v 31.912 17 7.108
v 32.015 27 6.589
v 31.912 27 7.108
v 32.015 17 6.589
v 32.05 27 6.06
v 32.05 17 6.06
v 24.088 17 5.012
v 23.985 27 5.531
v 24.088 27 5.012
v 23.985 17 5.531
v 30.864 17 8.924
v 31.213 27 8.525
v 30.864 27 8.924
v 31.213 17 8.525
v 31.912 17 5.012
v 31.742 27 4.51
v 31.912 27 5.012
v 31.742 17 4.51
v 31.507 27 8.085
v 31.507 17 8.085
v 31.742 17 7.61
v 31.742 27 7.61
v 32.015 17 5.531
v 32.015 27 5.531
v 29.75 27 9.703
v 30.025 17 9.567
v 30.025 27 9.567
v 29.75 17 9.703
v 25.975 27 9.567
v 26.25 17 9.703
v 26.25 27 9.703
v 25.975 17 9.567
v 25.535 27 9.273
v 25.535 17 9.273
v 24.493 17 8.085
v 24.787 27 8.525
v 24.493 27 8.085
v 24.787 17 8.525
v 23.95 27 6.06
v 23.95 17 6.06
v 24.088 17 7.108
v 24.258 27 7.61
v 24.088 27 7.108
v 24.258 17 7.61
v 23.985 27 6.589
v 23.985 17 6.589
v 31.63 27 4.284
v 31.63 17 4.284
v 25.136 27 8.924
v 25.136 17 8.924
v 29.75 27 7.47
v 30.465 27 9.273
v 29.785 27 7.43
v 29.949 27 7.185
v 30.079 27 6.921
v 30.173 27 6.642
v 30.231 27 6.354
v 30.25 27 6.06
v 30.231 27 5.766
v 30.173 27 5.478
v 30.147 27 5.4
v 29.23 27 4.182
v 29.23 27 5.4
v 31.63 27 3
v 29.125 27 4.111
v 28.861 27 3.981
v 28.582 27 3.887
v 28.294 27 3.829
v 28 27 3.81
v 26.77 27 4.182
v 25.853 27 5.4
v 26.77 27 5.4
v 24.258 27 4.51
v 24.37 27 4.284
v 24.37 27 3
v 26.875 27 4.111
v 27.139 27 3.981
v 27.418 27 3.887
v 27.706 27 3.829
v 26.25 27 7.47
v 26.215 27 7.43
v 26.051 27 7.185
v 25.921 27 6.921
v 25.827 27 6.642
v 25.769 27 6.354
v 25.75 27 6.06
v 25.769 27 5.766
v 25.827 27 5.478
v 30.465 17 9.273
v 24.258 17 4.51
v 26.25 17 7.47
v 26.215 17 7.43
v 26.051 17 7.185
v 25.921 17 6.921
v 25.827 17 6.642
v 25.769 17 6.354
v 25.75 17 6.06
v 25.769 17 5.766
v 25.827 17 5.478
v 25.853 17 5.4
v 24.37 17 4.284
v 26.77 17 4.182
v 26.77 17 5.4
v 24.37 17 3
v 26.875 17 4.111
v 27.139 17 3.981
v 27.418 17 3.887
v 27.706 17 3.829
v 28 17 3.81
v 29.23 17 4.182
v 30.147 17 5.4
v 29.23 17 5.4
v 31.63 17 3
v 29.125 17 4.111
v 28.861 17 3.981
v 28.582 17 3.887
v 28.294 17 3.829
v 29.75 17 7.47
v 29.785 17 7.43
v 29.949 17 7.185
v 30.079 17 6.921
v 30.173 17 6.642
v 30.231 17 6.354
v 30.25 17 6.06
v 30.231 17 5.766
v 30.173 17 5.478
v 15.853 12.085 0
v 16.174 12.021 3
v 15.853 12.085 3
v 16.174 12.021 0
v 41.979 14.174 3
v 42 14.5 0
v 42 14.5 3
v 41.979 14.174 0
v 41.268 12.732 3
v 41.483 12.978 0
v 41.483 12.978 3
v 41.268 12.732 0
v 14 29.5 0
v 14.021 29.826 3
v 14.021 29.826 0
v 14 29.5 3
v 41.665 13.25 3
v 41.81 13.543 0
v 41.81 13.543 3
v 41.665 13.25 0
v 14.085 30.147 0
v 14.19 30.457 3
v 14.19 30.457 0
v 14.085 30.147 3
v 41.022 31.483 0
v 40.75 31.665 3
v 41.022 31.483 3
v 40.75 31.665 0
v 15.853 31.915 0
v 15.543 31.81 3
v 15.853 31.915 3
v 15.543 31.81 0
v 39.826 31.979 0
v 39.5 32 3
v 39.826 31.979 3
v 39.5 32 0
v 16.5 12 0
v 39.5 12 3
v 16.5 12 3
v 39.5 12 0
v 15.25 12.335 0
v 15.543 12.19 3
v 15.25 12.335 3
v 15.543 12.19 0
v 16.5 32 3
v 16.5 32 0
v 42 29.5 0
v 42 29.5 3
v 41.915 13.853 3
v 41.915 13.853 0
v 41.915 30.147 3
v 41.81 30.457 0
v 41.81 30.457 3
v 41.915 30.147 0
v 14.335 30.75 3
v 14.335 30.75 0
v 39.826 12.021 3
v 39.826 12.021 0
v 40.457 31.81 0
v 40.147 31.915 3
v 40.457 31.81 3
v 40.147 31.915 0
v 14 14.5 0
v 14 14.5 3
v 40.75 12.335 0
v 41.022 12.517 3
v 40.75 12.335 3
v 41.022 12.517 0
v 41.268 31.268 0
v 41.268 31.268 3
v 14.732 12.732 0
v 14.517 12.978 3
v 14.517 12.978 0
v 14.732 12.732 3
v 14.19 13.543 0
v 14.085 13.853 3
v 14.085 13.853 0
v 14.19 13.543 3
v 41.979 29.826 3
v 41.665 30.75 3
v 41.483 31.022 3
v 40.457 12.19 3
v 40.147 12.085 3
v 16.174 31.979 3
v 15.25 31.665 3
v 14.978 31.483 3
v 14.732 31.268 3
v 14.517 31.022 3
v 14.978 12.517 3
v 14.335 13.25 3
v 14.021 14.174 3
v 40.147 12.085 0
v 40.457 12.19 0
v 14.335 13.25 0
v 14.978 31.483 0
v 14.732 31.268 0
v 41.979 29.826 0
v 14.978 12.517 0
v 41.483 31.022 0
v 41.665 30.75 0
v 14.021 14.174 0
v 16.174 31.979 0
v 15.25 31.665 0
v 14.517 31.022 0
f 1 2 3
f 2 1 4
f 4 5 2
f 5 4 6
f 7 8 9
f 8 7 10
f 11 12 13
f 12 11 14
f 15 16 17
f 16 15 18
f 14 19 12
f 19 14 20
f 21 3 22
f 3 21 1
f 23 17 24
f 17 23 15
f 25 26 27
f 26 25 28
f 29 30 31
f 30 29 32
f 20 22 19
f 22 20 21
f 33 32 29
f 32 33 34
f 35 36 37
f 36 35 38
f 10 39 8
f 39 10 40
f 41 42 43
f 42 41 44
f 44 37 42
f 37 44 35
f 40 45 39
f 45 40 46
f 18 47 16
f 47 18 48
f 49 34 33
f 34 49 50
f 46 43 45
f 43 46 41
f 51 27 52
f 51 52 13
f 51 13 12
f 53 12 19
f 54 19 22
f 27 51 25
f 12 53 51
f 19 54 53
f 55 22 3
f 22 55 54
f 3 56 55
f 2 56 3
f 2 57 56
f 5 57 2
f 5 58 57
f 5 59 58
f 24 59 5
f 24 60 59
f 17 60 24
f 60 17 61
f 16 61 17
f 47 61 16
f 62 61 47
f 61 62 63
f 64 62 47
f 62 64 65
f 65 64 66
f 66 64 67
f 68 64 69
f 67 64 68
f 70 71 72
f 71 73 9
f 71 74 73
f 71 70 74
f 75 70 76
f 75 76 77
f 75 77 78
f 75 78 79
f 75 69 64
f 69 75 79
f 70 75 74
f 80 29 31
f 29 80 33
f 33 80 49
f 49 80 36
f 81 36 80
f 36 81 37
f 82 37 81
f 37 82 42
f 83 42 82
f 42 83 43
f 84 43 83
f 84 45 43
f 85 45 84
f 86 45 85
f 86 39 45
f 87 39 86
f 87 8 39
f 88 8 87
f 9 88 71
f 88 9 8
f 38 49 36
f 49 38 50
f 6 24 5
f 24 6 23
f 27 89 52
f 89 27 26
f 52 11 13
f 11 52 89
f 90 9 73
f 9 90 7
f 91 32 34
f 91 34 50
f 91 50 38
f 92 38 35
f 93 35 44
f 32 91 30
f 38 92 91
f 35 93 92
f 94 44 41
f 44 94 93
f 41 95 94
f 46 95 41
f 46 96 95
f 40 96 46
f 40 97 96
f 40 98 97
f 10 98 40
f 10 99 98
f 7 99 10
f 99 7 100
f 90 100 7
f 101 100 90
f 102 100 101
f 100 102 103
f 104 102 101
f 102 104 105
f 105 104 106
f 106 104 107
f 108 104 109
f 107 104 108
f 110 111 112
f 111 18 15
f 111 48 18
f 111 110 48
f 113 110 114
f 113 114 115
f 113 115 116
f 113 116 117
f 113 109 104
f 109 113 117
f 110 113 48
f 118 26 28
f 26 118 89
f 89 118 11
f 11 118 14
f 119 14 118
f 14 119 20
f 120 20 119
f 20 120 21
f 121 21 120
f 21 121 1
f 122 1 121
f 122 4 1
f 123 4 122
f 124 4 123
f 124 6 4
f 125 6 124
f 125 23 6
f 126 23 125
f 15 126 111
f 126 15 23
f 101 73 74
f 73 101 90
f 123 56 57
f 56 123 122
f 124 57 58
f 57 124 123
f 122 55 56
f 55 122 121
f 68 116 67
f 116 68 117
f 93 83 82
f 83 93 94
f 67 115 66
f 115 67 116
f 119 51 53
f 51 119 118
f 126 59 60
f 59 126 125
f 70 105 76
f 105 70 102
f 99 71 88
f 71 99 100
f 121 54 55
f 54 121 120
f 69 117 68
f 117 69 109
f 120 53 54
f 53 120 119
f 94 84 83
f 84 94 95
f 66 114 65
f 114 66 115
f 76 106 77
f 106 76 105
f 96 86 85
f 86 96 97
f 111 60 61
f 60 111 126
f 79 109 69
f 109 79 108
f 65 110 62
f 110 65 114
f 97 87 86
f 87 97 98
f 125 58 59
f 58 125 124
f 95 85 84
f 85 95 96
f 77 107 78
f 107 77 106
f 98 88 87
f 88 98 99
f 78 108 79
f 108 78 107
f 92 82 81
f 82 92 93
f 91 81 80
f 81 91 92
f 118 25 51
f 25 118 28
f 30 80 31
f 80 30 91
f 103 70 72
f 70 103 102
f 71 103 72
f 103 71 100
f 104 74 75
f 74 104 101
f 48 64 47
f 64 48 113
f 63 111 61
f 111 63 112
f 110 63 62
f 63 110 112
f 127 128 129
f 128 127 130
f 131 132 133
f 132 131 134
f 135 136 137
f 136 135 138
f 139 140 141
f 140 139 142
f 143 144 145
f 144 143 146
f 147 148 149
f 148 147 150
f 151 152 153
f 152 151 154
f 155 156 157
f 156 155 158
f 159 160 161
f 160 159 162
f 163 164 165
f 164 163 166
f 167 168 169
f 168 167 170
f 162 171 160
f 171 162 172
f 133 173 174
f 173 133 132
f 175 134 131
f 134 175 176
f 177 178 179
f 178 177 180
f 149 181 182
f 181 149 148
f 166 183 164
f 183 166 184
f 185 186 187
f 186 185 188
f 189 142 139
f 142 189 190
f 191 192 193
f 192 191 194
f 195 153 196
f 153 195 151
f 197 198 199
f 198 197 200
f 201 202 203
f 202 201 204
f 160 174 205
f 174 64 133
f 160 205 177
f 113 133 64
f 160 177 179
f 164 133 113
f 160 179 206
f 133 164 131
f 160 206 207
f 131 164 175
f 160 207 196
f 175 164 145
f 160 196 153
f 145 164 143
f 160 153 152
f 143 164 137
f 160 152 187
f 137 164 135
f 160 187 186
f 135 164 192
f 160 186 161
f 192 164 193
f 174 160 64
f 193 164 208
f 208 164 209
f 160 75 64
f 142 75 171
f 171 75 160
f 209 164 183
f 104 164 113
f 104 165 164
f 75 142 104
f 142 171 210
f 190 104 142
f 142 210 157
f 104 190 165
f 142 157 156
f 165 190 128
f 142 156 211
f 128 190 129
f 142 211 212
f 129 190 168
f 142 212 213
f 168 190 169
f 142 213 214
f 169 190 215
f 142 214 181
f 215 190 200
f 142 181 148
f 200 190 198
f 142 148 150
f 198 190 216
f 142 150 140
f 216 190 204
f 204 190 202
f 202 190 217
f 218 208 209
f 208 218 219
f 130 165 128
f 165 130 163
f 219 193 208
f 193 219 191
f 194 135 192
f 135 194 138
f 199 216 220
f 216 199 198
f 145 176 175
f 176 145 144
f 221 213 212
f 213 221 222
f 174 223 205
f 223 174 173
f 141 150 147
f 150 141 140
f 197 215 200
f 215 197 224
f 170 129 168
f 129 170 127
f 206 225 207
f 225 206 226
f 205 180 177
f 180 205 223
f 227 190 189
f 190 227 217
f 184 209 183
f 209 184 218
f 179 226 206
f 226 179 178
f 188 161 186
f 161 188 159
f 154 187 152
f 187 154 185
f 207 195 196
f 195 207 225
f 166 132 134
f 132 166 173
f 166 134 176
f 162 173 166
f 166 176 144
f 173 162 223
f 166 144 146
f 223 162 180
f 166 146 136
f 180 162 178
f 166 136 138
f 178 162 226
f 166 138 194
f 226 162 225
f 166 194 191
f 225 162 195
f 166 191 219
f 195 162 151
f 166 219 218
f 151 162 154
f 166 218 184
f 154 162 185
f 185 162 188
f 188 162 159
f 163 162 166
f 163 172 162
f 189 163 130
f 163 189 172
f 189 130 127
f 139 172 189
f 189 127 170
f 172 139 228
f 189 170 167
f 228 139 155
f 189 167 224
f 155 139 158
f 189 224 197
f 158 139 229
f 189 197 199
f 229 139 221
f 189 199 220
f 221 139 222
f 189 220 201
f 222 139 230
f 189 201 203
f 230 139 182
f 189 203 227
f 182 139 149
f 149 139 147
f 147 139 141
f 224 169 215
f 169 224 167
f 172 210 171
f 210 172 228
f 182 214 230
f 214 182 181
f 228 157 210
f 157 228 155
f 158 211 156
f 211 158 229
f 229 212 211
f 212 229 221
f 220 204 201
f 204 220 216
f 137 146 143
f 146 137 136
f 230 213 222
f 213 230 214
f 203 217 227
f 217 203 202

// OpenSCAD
/*
Sample 113: Wiederlösbarer Kabel-Schnappclip — Kabel 4 mm
Generated from the FDM Mechanical Sample Library.
Units: millimetres.

Override examples:
  openscad -o custom.stl -D 'view="plate"' -D 'render_fn=64' model.scad
  openscad -o preview.png -D 'view="assembly"' model.scad
*/
use <../../../library/fdm_mechanisms.scad>

render_fn = is_undef(render_fn) ? 48 : render_fn;
view = is_undef(view) ? "plate" : view;
$fn = render_fn;

sample_cable_clip(
    view=view,
    cable_d=4,
    clearance=0.25,
    wall=1.8
);
